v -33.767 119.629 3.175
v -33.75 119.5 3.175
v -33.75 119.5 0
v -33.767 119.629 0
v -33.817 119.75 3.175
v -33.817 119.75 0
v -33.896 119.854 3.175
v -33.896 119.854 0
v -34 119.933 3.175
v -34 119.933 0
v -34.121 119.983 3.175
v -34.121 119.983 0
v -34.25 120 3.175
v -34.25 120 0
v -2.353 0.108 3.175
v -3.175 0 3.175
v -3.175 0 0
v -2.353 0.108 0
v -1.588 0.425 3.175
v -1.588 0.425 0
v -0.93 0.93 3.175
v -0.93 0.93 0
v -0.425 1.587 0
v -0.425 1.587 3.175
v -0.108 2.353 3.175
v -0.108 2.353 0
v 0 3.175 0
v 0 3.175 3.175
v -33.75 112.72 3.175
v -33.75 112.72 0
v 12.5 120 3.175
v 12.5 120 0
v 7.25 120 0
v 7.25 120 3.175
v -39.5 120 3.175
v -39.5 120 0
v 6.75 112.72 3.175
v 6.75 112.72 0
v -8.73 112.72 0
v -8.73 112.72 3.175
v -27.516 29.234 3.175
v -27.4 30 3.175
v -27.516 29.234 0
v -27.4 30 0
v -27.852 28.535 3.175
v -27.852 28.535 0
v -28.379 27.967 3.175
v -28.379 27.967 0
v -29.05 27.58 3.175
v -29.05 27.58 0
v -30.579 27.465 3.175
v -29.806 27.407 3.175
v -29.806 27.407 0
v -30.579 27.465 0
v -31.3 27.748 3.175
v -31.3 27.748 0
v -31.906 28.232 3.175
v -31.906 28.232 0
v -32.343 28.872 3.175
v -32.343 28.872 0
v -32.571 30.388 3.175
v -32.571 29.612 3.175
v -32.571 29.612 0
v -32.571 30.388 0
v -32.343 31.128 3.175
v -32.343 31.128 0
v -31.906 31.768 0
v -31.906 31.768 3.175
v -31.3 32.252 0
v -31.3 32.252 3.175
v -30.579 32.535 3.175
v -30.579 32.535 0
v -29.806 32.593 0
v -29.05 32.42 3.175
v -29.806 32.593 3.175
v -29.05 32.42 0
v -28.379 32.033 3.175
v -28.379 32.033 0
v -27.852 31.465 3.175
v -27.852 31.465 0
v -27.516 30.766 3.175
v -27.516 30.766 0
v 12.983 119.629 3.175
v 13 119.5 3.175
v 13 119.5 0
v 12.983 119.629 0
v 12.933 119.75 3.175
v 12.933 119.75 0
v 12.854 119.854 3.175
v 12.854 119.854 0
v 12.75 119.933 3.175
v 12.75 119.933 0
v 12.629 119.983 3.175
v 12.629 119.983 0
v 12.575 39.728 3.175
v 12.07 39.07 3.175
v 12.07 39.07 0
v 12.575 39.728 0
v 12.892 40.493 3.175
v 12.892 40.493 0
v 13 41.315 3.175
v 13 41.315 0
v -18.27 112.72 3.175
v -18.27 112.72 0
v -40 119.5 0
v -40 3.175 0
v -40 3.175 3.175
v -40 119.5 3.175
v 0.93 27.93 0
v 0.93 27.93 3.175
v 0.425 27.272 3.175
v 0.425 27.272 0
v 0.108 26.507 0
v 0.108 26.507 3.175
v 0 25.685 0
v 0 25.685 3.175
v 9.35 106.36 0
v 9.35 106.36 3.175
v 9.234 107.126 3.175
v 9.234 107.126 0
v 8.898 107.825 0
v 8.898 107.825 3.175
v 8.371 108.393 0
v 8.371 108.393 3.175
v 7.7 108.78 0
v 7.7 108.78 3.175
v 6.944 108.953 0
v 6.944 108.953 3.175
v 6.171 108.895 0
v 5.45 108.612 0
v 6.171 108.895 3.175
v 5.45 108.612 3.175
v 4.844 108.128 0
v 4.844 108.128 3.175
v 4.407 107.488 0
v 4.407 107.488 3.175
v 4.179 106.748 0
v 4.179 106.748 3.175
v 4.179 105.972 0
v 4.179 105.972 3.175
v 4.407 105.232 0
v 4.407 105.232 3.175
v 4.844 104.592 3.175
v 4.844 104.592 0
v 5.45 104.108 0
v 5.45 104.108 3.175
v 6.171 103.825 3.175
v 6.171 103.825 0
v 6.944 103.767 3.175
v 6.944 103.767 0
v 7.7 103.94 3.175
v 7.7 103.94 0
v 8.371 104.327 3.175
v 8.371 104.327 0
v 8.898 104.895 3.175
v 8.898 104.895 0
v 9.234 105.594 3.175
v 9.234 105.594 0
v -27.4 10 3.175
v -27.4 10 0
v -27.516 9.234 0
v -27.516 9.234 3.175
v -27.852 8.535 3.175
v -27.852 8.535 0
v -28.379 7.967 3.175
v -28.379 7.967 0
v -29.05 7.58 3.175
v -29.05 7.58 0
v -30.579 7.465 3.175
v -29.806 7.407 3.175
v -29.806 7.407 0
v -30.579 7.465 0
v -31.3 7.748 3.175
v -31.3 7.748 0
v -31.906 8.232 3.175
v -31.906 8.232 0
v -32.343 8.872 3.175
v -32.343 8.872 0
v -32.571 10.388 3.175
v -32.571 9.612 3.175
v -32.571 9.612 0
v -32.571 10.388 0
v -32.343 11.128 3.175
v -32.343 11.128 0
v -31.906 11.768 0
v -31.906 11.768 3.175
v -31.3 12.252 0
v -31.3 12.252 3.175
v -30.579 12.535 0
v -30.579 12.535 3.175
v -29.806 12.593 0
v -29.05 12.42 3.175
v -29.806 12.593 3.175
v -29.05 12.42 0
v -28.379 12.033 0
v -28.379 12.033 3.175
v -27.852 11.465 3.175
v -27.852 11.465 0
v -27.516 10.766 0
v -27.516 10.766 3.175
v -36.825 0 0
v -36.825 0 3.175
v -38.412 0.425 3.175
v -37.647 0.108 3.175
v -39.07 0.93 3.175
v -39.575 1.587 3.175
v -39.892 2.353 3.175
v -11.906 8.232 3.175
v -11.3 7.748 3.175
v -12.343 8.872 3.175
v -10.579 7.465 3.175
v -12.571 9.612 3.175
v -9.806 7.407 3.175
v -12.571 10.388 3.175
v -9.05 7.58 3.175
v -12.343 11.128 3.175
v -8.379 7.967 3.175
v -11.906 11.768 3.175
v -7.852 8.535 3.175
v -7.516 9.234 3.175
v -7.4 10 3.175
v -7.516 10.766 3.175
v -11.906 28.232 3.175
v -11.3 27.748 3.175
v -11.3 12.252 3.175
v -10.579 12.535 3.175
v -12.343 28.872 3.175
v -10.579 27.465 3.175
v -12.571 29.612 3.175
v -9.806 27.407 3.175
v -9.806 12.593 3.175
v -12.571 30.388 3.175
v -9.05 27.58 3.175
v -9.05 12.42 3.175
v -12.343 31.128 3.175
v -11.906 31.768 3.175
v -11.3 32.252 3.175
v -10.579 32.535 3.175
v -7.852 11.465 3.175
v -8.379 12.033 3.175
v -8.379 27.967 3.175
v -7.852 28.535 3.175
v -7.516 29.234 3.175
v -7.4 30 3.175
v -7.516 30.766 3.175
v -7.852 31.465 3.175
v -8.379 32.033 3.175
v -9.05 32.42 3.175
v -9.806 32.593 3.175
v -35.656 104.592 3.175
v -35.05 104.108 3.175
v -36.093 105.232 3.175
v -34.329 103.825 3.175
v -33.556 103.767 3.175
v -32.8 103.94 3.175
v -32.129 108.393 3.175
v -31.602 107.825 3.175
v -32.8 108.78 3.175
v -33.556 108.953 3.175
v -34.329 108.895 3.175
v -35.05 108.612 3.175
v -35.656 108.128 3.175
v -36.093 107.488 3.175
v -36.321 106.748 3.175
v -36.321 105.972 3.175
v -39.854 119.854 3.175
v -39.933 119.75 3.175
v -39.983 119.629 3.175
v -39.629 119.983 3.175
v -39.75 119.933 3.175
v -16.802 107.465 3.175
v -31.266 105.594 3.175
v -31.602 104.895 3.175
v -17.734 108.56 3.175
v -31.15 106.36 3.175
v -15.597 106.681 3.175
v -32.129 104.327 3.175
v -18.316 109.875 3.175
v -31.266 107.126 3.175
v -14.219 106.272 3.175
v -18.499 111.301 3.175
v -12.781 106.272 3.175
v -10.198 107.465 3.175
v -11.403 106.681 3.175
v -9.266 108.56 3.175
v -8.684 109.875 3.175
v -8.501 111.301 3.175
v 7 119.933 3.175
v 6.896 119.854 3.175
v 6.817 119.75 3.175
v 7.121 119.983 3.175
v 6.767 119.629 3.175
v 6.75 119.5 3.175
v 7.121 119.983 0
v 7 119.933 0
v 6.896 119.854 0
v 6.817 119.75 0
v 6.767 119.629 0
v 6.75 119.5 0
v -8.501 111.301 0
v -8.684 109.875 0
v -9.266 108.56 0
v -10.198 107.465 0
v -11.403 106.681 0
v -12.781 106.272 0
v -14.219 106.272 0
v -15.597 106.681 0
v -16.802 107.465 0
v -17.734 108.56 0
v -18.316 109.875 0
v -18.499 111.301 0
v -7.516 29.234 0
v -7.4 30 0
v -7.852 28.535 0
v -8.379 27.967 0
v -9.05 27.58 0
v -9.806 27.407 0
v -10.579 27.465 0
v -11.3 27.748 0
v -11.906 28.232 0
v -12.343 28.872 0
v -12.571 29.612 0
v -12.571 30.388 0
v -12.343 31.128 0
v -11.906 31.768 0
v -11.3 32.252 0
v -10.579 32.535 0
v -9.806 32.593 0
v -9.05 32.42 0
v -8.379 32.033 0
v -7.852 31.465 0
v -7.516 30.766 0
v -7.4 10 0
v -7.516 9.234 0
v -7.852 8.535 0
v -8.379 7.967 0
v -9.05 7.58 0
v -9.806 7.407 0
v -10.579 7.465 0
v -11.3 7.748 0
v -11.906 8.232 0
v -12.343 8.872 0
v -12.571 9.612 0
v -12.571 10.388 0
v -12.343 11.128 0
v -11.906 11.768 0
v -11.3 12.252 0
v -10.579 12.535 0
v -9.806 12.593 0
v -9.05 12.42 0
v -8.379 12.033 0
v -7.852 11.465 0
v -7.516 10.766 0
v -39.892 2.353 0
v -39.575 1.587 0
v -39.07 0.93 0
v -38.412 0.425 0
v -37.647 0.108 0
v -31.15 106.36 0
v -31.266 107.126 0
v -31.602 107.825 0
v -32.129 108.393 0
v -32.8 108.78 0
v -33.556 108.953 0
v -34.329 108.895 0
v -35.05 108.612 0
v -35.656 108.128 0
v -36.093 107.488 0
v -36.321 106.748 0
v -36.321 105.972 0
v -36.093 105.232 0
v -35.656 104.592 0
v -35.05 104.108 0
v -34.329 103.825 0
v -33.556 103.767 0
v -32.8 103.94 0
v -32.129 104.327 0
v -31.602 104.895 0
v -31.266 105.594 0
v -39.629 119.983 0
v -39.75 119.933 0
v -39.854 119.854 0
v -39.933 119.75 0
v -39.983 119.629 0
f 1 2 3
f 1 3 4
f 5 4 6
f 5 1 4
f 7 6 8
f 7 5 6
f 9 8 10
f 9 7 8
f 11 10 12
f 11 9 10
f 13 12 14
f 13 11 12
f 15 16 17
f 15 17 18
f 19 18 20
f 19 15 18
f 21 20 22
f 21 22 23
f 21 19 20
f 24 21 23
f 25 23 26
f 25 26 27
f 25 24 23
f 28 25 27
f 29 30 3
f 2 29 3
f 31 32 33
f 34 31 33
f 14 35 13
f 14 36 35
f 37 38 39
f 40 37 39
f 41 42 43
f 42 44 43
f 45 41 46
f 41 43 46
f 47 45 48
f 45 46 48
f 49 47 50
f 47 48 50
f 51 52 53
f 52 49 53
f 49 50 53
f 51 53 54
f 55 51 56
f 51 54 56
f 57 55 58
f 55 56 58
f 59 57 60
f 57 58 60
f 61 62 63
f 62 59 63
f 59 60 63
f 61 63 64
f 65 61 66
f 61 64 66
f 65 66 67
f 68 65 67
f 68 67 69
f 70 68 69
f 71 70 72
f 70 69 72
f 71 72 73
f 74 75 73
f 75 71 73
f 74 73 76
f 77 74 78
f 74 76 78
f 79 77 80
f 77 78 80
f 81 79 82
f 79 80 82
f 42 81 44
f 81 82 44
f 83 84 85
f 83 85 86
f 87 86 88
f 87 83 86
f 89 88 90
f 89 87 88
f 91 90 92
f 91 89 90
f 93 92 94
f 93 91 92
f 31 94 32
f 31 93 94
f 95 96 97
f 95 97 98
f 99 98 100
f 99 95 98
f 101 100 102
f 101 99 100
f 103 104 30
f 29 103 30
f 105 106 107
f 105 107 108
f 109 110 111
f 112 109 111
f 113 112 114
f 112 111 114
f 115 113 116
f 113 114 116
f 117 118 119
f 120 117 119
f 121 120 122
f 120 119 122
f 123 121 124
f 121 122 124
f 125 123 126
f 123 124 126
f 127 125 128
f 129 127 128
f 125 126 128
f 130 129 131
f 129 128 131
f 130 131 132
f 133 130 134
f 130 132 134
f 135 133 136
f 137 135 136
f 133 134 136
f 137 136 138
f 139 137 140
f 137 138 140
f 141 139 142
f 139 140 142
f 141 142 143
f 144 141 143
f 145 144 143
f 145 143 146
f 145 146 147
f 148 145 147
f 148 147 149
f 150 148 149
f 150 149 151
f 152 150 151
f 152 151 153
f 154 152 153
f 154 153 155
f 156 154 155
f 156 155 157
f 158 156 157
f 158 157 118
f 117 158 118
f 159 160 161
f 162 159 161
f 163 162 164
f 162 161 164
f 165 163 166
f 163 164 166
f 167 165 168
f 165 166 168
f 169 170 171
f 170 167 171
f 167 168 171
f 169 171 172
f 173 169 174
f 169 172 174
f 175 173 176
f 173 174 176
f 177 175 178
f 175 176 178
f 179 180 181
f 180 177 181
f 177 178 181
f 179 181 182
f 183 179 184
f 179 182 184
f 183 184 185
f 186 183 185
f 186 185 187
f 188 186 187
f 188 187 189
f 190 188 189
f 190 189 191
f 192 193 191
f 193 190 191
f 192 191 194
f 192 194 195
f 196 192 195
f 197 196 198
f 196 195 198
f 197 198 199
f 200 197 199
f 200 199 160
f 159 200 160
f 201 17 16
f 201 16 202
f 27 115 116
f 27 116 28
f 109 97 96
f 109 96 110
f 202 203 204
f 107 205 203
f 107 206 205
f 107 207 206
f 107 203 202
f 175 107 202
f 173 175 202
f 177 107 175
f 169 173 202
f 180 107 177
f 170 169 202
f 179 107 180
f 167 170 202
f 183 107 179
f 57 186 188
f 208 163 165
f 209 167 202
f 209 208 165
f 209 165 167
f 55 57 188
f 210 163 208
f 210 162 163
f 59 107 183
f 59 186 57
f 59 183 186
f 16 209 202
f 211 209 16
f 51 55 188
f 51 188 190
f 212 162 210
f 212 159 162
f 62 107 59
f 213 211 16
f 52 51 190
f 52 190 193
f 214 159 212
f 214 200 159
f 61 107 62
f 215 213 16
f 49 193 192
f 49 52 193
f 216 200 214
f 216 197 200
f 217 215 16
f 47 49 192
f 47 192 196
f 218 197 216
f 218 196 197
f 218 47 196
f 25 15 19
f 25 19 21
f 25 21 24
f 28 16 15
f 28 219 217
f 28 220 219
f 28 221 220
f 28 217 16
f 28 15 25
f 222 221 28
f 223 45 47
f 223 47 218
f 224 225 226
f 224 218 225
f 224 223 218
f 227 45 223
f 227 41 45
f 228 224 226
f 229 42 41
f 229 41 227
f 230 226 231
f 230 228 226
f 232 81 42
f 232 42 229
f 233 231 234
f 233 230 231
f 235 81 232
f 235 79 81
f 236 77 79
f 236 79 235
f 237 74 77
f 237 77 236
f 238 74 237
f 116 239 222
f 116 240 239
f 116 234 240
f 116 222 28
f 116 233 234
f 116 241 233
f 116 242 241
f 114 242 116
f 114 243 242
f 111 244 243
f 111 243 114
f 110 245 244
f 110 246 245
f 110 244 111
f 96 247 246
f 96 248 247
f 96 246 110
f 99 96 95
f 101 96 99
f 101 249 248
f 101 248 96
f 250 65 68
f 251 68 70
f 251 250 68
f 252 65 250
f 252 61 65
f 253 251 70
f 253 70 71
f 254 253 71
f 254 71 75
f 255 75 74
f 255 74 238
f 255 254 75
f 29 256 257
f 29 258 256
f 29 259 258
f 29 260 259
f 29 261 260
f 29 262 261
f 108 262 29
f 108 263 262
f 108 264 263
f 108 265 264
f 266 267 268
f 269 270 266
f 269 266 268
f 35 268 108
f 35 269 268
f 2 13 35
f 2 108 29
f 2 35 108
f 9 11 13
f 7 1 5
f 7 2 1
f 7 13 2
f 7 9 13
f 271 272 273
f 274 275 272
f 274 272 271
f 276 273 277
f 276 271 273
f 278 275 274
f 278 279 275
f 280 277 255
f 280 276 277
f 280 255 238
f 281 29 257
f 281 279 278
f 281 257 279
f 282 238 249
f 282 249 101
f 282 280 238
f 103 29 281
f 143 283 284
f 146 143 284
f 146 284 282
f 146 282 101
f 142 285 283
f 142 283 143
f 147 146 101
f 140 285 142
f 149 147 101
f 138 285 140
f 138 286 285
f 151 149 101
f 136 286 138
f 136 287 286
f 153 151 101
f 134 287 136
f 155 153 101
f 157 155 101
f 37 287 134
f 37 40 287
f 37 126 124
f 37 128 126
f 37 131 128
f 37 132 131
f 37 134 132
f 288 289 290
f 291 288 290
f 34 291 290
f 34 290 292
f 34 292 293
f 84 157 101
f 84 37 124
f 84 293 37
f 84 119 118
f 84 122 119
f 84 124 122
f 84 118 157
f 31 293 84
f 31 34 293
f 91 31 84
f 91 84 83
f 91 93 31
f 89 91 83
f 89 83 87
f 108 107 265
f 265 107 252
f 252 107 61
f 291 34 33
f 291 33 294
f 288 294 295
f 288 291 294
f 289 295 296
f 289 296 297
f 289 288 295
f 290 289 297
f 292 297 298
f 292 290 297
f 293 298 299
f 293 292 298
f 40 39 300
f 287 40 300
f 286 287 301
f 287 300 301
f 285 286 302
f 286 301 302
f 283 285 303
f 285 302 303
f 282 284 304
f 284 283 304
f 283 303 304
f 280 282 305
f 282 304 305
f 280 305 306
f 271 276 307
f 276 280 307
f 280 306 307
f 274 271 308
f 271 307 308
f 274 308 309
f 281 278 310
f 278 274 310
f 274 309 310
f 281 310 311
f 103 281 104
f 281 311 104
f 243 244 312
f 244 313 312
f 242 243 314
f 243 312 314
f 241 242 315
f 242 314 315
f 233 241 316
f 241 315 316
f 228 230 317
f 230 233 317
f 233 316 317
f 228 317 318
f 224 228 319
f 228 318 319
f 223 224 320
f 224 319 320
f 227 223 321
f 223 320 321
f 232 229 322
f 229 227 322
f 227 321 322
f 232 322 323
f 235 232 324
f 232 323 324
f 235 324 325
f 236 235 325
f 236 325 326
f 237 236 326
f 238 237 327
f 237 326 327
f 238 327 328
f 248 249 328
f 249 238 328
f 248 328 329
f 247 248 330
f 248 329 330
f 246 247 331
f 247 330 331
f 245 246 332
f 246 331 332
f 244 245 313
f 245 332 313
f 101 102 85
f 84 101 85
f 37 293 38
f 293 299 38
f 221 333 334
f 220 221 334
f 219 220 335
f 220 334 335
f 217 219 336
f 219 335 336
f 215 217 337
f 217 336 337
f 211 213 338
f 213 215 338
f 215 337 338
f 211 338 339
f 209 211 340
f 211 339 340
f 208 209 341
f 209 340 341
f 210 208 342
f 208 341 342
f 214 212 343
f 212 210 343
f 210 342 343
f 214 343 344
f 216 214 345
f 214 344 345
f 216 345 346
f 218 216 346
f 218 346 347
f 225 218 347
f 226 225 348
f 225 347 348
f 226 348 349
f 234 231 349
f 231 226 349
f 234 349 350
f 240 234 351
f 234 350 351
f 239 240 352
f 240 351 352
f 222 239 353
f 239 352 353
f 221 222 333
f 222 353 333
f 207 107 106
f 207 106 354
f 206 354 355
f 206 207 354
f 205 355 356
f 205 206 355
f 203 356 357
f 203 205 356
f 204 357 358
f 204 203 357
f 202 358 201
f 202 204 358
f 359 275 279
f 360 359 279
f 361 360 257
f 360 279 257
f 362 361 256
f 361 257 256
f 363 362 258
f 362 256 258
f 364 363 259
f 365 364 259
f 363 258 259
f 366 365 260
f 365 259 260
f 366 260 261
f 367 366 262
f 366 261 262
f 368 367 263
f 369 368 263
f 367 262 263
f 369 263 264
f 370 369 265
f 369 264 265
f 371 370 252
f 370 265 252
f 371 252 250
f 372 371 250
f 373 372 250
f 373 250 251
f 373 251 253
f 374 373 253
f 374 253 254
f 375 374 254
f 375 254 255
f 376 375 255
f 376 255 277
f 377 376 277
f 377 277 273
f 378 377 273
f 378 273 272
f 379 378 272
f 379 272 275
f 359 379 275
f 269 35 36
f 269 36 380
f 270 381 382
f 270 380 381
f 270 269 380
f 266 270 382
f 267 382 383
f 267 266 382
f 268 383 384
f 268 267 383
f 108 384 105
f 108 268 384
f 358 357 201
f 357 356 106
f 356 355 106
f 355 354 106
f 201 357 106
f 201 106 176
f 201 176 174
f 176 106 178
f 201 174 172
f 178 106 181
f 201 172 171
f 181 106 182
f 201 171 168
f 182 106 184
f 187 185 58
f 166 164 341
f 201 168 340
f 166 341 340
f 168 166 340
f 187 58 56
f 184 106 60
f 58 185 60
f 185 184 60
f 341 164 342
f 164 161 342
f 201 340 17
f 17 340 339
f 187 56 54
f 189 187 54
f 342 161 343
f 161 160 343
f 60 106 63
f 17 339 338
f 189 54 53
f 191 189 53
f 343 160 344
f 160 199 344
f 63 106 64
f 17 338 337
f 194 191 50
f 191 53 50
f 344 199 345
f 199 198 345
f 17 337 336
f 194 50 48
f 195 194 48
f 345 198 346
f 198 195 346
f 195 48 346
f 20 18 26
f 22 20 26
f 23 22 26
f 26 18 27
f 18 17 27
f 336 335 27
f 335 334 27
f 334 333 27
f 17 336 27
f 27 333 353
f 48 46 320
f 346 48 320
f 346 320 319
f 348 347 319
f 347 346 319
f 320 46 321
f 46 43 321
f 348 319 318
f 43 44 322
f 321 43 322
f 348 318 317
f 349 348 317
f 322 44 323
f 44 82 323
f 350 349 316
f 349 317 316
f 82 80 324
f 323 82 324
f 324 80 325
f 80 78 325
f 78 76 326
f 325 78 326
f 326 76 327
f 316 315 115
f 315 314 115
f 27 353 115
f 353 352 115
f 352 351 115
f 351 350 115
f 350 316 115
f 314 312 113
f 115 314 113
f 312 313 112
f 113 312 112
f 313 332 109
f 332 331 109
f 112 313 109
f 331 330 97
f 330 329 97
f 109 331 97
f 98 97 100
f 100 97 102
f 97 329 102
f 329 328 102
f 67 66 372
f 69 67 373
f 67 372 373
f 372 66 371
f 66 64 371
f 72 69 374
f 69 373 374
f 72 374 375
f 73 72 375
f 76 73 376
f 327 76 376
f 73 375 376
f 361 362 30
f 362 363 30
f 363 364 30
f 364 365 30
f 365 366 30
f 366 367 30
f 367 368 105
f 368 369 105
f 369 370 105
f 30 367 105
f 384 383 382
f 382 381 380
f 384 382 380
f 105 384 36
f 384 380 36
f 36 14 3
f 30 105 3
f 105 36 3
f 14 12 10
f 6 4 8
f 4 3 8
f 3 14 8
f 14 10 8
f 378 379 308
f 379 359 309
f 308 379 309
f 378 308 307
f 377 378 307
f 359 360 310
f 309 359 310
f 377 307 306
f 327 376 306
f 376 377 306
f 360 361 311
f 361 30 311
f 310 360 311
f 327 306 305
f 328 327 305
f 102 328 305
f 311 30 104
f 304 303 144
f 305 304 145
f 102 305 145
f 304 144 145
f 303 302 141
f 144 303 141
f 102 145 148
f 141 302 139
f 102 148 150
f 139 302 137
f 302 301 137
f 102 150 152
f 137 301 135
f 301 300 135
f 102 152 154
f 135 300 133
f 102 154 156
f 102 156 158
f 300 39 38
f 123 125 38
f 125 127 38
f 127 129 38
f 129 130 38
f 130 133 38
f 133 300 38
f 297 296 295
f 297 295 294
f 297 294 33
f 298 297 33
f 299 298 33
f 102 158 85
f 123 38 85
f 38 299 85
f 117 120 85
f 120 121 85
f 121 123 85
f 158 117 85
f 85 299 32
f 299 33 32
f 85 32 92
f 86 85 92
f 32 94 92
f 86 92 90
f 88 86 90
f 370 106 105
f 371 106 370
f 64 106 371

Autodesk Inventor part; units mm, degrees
ref_plane "YZ Plane" through (0, 0, 0) normal (1, 0, 0) x (0, 1, 0)
ref_plane "XZ Plane" through (0, 0, 0) normal (0, 1, 0) x (-1, 0, 0)
ref_plane "XY Plane" through (0, 0, 0) normal (0, 0, 1) x (1, 0, 0)
sketch "Sketch1" plane through (0, 0, 0) normal (0, 0, 1) x (1, 0, 0)
  line L0 (0, 0) -> (-40, 0)
  line L1 (-40, 0) -> (-40, 40)
  line L2 (-40, 40) -> (0, 40)
  line L3 (0, 40) -> (0, 0)
  line L4 (-30, 30) -> (-10, 30) construction
  line L5 (-10, 30) -> (-10, 10) construction
  line L6 (-10, 10) -> (-30, 10) construction
  line L7 (-30, 10) -> (-30, 30) construction
  line L8 (-30, 30) -> (-40, 30) construction
  line L9 (-10, 10) -> (0, 10) construction
  circle A0 centre (-30, 30) radius 2.6
  circle A1 centre (-10, 30) radius 2.6
  circle A2 centre (-10, 10) radius 2.6
  circle A3 centre (-30, 10) radius 2.6
  line L10 (-40, 40) -> (13, 40)
  line L11 (13, 40) -> (13, 100)
  line L12 (13, 100) -> (-40, 100)
  line L13 (-40, 100) -> (-40, 40)
  line L14 (13, 40) -> (0, 27)
  line L15 (-40, 100) -> (13, 100)
  line L16 (13, 100) -> (13, 120)
  line L17 (-40, 120) -> (-40, 100)
  line L18 (6.75, 120) -> (6.75, 112.72)
  line L19 (6.75, 112.72) -> (-33.75, 112.72)
  line L20 (-33.75, 112.72) -> (-33.75, 120)
  line L21 (-33.75, 112.72) -> (-40, 112.72) construction
  line L22 (6.75, 112.72) -> (13, 112.72) construction
  line L23 (-40, 120) -> (-33.75, 120)
  line L24 (13, 120) -> (6.75, 120)
  line L25 (-13.5, 112.72) -> (-13.5, 111.22) construction
  arc A4 (-18.2697, 112.72) -> (-8.7303, 112.72) centre (-13.5, 111.22) ccw
  dimension "d0" = 40
  dimension "d1" = 40
  dimension "d2" = 5.2
  dimension "d3" = 5.2
  dimension "d4" = 5.2
  dimension "d5" = 5.2
  dimension "d6" = 20
  dimension "d7" = 20
  dimension "d8" = 10
  dimension "d9" = 60
  dimension "d10" = 53
  dimension "d11" = 45
  dimension "d12" = 20
  dimension "d13" = 40.5
  dimension "d14" = 7.28
  dimension "d15" = 1.5
  dimension "d16" = 10
  dimension "d17" = 20
extrude "Extrusion1" add sketch "Sketch1" along normal blind 3.175 contours L0 L1 L2 L3 | L3 L10 L14 | L13 L12 L11 L10 L2 | L17 L23 L20 L19 A4 L18 L24 L16 L12
fillet "Fillet1" radius 3.175 4 edges at (0, 0, 1.5875) (-40, 0, 1.5875) (0, 27, 1.5875) (13, 40, 1.5875)
fillet "Fillet2" radius 0.5 4 edges at (13, 120, 1.5875) (-40, 120, 1.5875) (-33.75, 120, 1.5875) (6.75, 120, 1.5875)
sketch "Sketch2" plane through (0, 0, 3.175) normal (0, 0, 1) x (1, 0, 0)
  line L0 (13, 41.3151) -> (13, 119.5) construction
  line L1 (-40, 121.004) -> (13, 121.004) construction
  line L2 (13, 121.004) -> (13, 101.004) construction
  line L3 (13, 101.004) -> (-40, 101.004) construction
  line L4 (-40, 101.004) -> (-40, 121.004) construction
  circle A0 centre (-33.75, 106.36) radius 2.6
  circle A1 centre (6.75, 106.36) radius 2.6
  line L5 (-18.2697, 112.72) -> (-33.75, 112.72) construction
  line L6 (-33.75, 106.36) -> (-33.75, 112.72) construction
  line L7 (6.75, 112.72) -> (-8.7303, 112.72) construction
  line L8 (6.75, 106.36) -> (6.75, 112.72) construction
  point P0 (0, 0)
  dimension "d22" = 20
  dimension "d23" = 5.2
  dimension "d24" = 5.2
  dimension "d25" = 6.36
  dimension "d26" = 6.36
extrude "Extrusion2" cut sketch "Sketch2" against normal up to next
equation "\"d3\" = d2"
equation "\"d4\" = d2"
equation "\"d5\" = d2"
equation "\"d24\" = d23"
equation "\"d26\" = d25"
properties part number "X Axis Statonary Composite Belt Holder RIGHT"
